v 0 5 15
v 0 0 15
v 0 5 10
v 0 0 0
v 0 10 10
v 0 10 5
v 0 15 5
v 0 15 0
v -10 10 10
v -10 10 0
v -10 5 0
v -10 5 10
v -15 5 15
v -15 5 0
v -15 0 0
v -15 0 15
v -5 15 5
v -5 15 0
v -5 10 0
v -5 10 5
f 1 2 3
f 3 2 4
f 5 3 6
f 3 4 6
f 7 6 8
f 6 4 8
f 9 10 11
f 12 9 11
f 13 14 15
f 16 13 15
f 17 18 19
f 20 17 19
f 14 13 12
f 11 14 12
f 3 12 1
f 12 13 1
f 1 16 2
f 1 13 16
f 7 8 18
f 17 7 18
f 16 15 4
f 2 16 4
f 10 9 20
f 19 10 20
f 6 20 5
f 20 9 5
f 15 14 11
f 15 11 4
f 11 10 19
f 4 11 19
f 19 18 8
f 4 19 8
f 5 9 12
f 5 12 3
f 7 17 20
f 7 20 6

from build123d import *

# Parameters (mm, degrees)
BOSS_EXTRUDE1_DEPTH = 15
SKETCH2_W           = 10
SKETCH2_H           = 5
CUT_EXTRUDE1_DEPTH  = 5
SKETCH3_W           = 5
SKETCH3_H           = 5
CUT_EXTRUDE2_DEPTH  = 10


with BuildPart() as part:
    # Sketch1 → Boss-Extrude1 (new body)
    with BuildSketch(Plane.XY):
        Polygon((0, 0), (0, 15), (-5, 15), (-5, 10), (-10, 10), (-10, 5), (-15, 5), (-15, 0), align=None)
    extrude(amount=BOSS_EXTRUDE1_DEPTH)

    # Sketch2 → Cut-Extrude1 (cut)
    with BuildSketch(Plane.XY.offset(15)):
        with Locations((-5, 7.5)):
            Rectangle(SKETCH2_W, SKETCH2_H)
    extrude(amount=-CUT_EXTRUDE1_DEPTH, mode=Mode.SUBTRACT)

    # Sketch3 → Cut-Extrude2 (cut)
    with BuildSketch(Plane.XY.offset(15)):
        with Locations((-2.5, 12.5)):
            Rectangle(SKETCH3_W, SKETCH3_H)
    extrude(amount=-CUT_EXTRUDE2_DEPTH, mode=Mode.SUBTRACT)


solid = part.part
